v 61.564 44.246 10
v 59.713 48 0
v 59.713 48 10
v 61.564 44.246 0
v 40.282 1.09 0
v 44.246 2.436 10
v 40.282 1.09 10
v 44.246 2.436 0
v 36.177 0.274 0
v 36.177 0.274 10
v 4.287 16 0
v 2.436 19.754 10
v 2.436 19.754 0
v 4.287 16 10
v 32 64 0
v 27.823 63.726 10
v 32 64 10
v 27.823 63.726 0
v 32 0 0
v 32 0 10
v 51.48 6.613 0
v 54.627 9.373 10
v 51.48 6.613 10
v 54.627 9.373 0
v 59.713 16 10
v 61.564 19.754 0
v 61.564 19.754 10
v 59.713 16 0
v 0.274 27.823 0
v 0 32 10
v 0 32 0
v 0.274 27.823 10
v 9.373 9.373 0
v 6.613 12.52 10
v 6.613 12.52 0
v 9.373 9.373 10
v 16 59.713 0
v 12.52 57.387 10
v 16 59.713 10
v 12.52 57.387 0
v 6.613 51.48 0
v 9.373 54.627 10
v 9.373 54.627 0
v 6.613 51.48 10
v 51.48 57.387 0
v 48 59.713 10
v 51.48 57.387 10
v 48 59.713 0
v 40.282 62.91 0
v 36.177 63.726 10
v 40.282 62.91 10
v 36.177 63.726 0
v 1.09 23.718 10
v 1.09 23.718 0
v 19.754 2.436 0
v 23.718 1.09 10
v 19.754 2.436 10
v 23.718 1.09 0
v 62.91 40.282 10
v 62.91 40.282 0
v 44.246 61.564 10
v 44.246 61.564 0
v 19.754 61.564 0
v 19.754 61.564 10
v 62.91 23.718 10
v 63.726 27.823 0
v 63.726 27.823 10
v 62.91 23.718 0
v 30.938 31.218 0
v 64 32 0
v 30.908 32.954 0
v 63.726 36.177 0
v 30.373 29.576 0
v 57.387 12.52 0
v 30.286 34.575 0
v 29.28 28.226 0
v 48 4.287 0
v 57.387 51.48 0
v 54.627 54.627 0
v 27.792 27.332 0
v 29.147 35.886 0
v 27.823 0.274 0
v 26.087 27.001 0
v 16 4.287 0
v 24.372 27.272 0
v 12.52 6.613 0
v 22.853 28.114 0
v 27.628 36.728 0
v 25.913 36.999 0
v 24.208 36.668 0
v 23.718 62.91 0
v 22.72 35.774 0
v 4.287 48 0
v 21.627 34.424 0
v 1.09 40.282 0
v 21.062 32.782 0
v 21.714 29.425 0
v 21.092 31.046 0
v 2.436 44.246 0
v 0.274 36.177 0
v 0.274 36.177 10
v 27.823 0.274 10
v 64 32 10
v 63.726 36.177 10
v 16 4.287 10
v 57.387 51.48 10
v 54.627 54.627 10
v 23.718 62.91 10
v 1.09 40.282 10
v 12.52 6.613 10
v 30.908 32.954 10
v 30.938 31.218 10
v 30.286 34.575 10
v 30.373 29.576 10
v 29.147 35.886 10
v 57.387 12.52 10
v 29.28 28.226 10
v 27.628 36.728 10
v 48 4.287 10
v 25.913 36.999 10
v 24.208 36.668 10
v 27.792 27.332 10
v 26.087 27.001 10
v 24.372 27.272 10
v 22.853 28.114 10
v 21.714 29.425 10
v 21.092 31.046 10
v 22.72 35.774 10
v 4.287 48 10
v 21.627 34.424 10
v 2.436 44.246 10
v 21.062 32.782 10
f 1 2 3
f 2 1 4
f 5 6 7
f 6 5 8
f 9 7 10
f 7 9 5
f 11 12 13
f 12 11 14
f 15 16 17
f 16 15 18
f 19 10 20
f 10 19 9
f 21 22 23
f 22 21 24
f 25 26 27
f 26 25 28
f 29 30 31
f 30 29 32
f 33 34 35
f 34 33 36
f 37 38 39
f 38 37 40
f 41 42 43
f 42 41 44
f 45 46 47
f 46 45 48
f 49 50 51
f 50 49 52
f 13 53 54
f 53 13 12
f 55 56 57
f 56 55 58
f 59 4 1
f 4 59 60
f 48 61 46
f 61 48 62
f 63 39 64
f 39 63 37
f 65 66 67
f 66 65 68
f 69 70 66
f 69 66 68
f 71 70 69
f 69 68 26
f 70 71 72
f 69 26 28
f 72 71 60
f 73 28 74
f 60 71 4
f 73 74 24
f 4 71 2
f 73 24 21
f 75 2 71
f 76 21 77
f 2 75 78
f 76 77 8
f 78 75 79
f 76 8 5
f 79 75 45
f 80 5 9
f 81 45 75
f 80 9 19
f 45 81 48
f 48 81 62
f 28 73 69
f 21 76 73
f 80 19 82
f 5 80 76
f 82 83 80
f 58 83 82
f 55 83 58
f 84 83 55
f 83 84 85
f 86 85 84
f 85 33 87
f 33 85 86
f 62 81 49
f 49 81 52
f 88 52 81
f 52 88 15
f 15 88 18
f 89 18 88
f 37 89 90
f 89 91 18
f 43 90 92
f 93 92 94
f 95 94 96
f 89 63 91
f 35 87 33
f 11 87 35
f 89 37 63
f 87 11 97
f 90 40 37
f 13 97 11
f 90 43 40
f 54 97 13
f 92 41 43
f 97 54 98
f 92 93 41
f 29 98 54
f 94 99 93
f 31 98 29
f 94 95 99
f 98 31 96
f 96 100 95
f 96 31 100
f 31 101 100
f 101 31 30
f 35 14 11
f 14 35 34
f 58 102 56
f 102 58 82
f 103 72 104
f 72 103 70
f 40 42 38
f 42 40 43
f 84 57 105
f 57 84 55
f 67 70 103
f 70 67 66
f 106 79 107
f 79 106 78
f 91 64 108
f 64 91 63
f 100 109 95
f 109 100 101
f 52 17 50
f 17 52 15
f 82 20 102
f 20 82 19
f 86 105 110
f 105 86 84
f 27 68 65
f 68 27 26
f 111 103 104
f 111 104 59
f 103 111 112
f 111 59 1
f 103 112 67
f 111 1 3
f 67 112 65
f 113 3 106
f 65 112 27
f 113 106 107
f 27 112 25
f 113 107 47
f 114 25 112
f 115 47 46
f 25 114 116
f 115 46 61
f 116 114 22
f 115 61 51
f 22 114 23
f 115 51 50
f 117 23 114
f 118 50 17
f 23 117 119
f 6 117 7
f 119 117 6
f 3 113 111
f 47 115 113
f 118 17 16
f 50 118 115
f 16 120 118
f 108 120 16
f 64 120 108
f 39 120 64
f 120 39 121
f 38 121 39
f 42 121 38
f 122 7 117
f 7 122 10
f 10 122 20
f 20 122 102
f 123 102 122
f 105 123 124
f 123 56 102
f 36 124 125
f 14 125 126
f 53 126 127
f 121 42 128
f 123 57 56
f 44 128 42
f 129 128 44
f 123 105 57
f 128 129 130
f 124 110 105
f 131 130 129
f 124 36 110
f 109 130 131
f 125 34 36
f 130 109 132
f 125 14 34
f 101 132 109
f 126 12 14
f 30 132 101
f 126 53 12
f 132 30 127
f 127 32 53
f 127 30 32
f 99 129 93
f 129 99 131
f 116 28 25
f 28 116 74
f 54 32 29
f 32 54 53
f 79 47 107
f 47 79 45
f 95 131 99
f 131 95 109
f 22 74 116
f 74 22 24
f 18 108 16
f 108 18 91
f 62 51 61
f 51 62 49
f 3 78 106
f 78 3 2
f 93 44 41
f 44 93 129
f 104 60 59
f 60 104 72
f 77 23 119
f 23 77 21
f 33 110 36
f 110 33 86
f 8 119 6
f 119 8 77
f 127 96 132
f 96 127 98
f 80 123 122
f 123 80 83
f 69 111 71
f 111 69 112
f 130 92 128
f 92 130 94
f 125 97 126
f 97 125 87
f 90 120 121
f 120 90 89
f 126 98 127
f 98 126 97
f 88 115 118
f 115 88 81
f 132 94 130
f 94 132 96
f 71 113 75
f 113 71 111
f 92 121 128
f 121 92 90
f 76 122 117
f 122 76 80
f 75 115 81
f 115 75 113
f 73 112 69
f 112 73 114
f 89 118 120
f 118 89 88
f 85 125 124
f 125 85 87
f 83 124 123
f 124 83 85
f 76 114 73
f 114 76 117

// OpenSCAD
$fn = 32;

// ----------------------------------------------------------------------
// Cam plate: eccentric cam, base R32
// ----------------------------------------------------------------------

// --- parameters (mm) ---
base_r = 32;              // base circle radius
lobe_h = 12;              // cam lobe rise
bore_r = 5;               // shaft bore radius
plate_t = 10;             // plate thickness, Z (extrusion height)
ecc = 6;                  // disc eccentricity

profile = [[64, 32], [63.726, 36.177], [62.91, 40.282], [61.564, 44.246], [59.713, 48], [57.387, 51.48], [54.627, 54.627], [51.48, 57.387], [48, 59.713], [44.246, 61.564], [40.282, 62.91], [36.177, 63.726], [32, 64], [27.823, 63.726], [23.718, 62.91], [19.754, 61.564], [16, 59.713], [12.52, 57.387], [9.373, 54.627], [6.613, 51.48], [4.287, 48], [2.436, 44.246], [1.09, 40.282], [0.274, 36.177], [0, 32], [0.274, 27.823], [1.09, 23.718], [2.436, 19.754], [4.287, 16], [6.613, 12.52], [9.373, 9.373], [12.52, 6.613], [16, 4.287], [19.754, 2.436], [23.718, 1.09], [27.823, 0.274], [32, 0], [36.177, 0.274], [40.282, 1.09], [44.246, 2.436], [48, 4.287], [51.48, 6.613], [54.627, 9.373], [57.387, 12.52], [59.713, 16], [61.564, 19.754], [62.91, 23.718], [63.726, 27.823]];  // primary outline, 48 points, counter clockwise
void_1 = [[30.908, 32.954], [30.286, 34.575], [29.147, 35.886], [27.628, 36.728], [25.913, 36.999], [24.208, 36.668], [22.72, 35.774], [21.627, 34.424], [21.062, 32.782], [21.092, 31.046], [21.714, 29.425], [22.853, 28.114], [24.372, 27.272], [26.087, 27.001], [27.792, 27.332], [29.28, 28.226], [30.373, 29.576], [30.938, 31.218]];  // shaft bore, 18 points

// --- the one profile operation ---
difference() {
  linear_extrude(height = plate_t) polygon(points = profile);
  translate([0, 0, -1])
    linear_extrude(height = plate_t + 2) polygon(points = void_1);
}
